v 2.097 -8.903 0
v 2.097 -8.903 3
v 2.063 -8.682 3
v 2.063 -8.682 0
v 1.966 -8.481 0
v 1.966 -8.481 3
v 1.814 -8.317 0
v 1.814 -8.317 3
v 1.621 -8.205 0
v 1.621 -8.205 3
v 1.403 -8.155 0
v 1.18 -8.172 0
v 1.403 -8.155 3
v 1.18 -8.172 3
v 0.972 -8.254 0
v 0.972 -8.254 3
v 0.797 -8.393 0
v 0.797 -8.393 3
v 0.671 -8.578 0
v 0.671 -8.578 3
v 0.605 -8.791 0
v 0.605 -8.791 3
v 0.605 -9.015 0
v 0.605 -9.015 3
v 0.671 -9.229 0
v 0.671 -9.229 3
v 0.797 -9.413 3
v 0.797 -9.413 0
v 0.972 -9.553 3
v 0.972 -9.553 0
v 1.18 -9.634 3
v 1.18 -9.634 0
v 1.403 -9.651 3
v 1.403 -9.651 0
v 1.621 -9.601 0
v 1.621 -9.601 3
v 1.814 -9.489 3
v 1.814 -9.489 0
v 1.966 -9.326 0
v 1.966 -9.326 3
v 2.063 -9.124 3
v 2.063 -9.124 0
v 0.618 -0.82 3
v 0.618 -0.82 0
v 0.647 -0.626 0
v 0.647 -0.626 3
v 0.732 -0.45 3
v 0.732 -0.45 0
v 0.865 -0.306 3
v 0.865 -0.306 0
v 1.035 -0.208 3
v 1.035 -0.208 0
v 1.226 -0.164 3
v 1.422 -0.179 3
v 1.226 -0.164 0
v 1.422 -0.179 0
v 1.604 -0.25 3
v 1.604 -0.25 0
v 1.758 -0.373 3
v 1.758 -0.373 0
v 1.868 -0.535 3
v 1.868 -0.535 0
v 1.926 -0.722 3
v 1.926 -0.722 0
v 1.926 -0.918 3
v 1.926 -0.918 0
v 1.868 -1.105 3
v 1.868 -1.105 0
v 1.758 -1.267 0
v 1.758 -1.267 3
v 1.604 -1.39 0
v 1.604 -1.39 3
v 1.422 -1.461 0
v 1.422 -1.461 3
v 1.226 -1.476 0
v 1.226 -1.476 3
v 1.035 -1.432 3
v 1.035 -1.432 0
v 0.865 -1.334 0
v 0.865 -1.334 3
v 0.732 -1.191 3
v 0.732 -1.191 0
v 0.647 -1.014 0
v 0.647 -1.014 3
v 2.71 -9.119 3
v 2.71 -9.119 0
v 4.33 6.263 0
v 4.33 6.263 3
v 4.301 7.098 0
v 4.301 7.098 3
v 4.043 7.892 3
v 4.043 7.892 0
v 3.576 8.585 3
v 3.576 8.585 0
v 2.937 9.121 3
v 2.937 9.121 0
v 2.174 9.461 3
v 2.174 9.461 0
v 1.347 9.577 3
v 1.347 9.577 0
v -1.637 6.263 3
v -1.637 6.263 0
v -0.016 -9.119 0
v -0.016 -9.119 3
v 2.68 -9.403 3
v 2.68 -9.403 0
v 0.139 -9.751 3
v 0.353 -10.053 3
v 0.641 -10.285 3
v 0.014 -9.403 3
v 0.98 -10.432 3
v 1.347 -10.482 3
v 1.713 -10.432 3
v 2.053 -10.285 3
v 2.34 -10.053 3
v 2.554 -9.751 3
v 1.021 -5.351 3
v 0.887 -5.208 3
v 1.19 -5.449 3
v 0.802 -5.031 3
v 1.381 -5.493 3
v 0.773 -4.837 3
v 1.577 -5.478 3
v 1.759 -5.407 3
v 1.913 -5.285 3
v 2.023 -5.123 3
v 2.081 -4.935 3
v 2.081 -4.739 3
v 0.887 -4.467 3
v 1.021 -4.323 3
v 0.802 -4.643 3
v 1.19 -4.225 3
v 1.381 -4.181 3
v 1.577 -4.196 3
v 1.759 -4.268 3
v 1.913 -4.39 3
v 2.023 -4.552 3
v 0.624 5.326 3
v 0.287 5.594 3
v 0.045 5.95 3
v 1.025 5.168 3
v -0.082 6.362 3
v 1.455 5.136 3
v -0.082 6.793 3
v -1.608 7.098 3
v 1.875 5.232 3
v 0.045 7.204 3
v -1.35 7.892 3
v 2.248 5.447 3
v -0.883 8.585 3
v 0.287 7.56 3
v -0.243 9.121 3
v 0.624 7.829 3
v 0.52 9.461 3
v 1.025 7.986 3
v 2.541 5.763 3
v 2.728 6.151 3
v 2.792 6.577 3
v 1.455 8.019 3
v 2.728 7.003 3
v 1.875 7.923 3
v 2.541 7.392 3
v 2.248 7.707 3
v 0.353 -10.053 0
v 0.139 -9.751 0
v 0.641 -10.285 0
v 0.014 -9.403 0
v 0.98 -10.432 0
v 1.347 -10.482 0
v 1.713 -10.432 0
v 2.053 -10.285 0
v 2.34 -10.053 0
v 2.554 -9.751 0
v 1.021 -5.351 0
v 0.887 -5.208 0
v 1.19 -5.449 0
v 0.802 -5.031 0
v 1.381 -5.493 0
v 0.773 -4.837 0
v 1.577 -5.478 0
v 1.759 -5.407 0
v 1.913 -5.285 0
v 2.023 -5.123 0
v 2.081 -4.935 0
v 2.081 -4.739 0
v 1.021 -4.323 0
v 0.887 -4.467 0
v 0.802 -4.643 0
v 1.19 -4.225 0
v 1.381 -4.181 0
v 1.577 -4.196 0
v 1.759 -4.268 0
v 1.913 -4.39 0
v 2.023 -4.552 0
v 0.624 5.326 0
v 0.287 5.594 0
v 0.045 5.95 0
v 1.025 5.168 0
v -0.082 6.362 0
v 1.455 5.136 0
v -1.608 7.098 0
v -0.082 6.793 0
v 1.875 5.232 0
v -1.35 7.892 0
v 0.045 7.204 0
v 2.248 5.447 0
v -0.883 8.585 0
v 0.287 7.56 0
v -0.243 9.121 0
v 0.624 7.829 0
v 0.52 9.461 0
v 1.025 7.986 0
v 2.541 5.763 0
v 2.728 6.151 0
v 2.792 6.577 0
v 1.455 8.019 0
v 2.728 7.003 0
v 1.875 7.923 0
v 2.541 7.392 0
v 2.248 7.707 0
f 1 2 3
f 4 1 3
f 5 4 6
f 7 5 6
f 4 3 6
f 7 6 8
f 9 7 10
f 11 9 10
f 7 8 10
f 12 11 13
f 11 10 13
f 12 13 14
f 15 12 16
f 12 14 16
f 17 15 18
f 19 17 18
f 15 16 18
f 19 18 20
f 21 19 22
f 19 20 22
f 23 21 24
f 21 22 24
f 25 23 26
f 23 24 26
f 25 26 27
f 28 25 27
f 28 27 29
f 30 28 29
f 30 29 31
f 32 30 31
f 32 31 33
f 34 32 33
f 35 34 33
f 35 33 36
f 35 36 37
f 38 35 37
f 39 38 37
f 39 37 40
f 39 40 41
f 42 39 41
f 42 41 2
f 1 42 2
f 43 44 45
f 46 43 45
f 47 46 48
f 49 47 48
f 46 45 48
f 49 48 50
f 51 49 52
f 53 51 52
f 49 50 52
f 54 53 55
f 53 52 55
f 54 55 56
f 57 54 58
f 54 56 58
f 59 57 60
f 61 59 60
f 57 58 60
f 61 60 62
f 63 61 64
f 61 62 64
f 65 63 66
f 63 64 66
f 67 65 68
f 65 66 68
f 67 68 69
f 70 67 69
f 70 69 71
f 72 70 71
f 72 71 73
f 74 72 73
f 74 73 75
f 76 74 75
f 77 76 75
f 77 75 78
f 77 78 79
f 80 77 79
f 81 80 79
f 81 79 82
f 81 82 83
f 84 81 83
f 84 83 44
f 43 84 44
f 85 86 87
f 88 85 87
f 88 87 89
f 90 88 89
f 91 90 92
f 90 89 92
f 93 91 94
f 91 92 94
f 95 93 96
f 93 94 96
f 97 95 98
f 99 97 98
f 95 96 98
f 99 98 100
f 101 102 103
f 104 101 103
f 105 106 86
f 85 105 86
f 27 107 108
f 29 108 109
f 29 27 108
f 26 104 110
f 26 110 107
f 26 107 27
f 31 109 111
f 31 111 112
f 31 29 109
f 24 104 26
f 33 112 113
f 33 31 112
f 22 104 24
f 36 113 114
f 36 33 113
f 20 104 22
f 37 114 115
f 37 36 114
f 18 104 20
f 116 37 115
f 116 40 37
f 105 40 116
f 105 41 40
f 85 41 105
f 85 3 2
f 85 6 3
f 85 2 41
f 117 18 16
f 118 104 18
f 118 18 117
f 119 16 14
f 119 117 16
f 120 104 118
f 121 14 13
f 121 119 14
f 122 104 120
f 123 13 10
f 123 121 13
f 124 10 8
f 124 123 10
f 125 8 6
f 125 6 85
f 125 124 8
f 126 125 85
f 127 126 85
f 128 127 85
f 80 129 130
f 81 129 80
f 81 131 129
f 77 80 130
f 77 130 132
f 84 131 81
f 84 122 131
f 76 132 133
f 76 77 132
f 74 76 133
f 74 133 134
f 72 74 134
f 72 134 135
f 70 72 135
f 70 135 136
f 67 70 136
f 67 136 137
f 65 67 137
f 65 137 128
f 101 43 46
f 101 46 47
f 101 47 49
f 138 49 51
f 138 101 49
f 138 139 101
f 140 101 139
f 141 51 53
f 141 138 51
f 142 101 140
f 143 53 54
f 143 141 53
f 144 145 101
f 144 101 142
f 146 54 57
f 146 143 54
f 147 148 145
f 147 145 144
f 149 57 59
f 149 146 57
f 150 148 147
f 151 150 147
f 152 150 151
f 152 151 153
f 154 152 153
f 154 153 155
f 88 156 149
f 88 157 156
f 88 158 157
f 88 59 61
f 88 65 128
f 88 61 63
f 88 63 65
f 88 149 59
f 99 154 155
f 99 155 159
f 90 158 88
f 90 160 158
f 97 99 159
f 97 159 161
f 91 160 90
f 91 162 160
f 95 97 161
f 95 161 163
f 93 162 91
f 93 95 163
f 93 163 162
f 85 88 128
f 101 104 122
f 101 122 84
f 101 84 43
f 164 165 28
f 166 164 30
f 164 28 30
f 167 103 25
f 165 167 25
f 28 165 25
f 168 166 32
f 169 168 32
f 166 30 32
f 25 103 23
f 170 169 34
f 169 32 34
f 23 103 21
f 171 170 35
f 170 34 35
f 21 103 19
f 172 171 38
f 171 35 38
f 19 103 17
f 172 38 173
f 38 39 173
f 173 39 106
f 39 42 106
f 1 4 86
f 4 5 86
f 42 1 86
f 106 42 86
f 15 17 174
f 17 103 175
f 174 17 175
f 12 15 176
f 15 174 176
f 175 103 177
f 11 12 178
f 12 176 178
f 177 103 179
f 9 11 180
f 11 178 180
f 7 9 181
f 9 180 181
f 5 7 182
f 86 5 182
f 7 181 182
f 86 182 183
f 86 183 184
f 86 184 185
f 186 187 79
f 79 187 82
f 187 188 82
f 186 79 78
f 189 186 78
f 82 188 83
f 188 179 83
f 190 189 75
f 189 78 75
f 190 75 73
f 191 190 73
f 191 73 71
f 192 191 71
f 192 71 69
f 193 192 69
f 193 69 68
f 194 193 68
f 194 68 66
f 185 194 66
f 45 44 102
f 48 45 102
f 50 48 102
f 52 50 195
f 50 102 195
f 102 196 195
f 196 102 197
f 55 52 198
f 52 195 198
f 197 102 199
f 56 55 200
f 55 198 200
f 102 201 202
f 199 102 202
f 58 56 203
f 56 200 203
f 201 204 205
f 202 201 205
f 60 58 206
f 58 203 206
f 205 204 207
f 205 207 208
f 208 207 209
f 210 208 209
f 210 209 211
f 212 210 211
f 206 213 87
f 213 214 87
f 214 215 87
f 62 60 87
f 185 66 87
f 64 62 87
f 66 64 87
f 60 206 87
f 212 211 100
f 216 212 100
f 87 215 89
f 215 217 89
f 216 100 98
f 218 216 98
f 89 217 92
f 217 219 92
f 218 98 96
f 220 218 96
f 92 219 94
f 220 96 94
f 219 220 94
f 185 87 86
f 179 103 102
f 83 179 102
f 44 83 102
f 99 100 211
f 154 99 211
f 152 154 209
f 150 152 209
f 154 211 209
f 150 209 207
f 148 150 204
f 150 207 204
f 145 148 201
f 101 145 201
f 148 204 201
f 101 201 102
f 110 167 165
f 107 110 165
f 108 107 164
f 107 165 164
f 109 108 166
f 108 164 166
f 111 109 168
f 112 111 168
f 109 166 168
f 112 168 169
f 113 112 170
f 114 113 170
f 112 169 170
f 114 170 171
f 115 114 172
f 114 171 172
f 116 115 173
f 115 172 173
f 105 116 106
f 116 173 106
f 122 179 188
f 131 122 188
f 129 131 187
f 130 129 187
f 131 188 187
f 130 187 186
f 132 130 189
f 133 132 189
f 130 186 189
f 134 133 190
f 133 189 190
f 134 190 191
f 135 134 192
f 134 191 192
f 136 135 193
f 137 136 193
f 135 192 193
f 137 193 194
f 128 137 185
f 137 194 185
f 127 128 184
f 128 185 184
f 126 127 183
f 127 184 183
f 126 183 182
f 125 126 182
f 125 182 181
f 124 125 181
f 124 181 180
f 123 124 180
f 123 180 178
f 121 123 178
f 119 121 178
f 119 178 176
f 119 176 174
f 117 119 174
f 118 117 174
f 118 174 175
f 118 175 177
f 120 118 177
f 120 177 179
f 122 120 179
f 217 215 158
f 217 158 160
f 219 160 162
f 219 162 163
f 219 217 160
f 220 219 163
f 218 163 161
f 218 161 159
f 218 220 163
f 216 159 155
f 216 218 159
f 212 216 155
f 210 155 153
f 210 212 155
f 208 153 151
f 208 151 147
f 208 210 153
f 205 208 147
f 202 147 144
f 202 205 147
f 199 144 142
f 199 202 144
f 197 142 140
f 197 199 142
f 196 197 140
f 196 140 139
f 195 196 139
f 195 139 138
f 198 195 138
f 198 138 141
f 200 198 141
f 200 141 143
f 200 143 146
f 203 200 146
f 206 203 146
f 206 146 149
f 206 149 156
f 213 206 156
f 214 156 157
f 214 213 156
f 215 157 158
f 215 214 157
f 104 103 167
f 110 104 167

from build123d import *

# Parameters (mm, degrees)
SKETCH1_R           = 1.445304889
BOSS_EXTRUDE1_DEPTH = 3
SKETCH2_R           = 0.75
CUT_EXTRUDE1_DEPTH  = 10
SKETCH3_R           = 0.657732985
CUT_EXTRUDE2_DEPTH  = 4
SKETCH4_R           = 0.657732985
CUT_EXTRUDE3_DEPTH  = 4


with BuildPart() as part:
    # Sketch1 → Boss-Extrude1 (new body)
    with BuildSketch(Plane.XY):
        with BuildLine():
            Line((2.709665951, -9.119248637), (4.330233257, 6.26308765))
            ThreePointArc((4.330233257, 6.26308765), (3.57642555, 8.584523689), (1.346744655, 9.577405579))
            ThreePointArc((1.346744655, 9.577405579), (-0.88293624, 8.584523689), (-1.636743947, 6.26308765))
            Line((-1.636743947, 6.26308765), (-0.016176641, -9.119248637))
            Line((-0.016176641, -9.119248637), (0.013745769, -9.403270519))
            ThreePointArc((0.013745769, -9.403270519), (1.346744655, -10.482169933), (2.679743541, -9.403270519))
            Line((2.679743541, -9.403270519), (2.709665951, -9.119248637))
        make_face()
        with Locations((1.346744655, 6.577405579)):
            Circle(SKETCH1_R, mode=Mode.SUBTRACT)
    extrude(amount=BOSS_EXTRUDE1_DEPTH)

    # Sketch2 → Cut-Extrude1 (cut)
    with BuildSketch(Plane.XY.offset(3)):
        with Locations((1.346744655, -8.903103928)):
            Circle(SKETCH2_R)
    extrude(amount=-CUT_EXTRUDE1_DEPTH, mode=Mode.SUBTRACT)

    # Sketch3 → Cut-Extrude2 (cut, through all)
    with BuildSketch(Plane(origin=(0, 0, 0), x_dir=(-1, 0, 0), z_dir=(0, 0, -1))):
        with Locations((-1.275359723, -0.820045285)):
            Circle(SKETCH3_R)
    extrude(amount=-CUT_EXTRUDE2_DEPTH, mode=Mode.SUBTRACT)

    # Sketch4 → Cut-Extrude3 (cut, through all)
    with BuildSketch(Plane(origin=(0, 0, 0), x_dir=(-1, 0, 0), z_dir=(0, 0, -1))):
        with Locations((-1.43062658, -4.837170951)):
            Circle(SKETCH4_R)
    extrude(amount=-CUT_EXTRUDE3_DEPTH, mode=Mode.SUBTRACT)


solid = part.part
